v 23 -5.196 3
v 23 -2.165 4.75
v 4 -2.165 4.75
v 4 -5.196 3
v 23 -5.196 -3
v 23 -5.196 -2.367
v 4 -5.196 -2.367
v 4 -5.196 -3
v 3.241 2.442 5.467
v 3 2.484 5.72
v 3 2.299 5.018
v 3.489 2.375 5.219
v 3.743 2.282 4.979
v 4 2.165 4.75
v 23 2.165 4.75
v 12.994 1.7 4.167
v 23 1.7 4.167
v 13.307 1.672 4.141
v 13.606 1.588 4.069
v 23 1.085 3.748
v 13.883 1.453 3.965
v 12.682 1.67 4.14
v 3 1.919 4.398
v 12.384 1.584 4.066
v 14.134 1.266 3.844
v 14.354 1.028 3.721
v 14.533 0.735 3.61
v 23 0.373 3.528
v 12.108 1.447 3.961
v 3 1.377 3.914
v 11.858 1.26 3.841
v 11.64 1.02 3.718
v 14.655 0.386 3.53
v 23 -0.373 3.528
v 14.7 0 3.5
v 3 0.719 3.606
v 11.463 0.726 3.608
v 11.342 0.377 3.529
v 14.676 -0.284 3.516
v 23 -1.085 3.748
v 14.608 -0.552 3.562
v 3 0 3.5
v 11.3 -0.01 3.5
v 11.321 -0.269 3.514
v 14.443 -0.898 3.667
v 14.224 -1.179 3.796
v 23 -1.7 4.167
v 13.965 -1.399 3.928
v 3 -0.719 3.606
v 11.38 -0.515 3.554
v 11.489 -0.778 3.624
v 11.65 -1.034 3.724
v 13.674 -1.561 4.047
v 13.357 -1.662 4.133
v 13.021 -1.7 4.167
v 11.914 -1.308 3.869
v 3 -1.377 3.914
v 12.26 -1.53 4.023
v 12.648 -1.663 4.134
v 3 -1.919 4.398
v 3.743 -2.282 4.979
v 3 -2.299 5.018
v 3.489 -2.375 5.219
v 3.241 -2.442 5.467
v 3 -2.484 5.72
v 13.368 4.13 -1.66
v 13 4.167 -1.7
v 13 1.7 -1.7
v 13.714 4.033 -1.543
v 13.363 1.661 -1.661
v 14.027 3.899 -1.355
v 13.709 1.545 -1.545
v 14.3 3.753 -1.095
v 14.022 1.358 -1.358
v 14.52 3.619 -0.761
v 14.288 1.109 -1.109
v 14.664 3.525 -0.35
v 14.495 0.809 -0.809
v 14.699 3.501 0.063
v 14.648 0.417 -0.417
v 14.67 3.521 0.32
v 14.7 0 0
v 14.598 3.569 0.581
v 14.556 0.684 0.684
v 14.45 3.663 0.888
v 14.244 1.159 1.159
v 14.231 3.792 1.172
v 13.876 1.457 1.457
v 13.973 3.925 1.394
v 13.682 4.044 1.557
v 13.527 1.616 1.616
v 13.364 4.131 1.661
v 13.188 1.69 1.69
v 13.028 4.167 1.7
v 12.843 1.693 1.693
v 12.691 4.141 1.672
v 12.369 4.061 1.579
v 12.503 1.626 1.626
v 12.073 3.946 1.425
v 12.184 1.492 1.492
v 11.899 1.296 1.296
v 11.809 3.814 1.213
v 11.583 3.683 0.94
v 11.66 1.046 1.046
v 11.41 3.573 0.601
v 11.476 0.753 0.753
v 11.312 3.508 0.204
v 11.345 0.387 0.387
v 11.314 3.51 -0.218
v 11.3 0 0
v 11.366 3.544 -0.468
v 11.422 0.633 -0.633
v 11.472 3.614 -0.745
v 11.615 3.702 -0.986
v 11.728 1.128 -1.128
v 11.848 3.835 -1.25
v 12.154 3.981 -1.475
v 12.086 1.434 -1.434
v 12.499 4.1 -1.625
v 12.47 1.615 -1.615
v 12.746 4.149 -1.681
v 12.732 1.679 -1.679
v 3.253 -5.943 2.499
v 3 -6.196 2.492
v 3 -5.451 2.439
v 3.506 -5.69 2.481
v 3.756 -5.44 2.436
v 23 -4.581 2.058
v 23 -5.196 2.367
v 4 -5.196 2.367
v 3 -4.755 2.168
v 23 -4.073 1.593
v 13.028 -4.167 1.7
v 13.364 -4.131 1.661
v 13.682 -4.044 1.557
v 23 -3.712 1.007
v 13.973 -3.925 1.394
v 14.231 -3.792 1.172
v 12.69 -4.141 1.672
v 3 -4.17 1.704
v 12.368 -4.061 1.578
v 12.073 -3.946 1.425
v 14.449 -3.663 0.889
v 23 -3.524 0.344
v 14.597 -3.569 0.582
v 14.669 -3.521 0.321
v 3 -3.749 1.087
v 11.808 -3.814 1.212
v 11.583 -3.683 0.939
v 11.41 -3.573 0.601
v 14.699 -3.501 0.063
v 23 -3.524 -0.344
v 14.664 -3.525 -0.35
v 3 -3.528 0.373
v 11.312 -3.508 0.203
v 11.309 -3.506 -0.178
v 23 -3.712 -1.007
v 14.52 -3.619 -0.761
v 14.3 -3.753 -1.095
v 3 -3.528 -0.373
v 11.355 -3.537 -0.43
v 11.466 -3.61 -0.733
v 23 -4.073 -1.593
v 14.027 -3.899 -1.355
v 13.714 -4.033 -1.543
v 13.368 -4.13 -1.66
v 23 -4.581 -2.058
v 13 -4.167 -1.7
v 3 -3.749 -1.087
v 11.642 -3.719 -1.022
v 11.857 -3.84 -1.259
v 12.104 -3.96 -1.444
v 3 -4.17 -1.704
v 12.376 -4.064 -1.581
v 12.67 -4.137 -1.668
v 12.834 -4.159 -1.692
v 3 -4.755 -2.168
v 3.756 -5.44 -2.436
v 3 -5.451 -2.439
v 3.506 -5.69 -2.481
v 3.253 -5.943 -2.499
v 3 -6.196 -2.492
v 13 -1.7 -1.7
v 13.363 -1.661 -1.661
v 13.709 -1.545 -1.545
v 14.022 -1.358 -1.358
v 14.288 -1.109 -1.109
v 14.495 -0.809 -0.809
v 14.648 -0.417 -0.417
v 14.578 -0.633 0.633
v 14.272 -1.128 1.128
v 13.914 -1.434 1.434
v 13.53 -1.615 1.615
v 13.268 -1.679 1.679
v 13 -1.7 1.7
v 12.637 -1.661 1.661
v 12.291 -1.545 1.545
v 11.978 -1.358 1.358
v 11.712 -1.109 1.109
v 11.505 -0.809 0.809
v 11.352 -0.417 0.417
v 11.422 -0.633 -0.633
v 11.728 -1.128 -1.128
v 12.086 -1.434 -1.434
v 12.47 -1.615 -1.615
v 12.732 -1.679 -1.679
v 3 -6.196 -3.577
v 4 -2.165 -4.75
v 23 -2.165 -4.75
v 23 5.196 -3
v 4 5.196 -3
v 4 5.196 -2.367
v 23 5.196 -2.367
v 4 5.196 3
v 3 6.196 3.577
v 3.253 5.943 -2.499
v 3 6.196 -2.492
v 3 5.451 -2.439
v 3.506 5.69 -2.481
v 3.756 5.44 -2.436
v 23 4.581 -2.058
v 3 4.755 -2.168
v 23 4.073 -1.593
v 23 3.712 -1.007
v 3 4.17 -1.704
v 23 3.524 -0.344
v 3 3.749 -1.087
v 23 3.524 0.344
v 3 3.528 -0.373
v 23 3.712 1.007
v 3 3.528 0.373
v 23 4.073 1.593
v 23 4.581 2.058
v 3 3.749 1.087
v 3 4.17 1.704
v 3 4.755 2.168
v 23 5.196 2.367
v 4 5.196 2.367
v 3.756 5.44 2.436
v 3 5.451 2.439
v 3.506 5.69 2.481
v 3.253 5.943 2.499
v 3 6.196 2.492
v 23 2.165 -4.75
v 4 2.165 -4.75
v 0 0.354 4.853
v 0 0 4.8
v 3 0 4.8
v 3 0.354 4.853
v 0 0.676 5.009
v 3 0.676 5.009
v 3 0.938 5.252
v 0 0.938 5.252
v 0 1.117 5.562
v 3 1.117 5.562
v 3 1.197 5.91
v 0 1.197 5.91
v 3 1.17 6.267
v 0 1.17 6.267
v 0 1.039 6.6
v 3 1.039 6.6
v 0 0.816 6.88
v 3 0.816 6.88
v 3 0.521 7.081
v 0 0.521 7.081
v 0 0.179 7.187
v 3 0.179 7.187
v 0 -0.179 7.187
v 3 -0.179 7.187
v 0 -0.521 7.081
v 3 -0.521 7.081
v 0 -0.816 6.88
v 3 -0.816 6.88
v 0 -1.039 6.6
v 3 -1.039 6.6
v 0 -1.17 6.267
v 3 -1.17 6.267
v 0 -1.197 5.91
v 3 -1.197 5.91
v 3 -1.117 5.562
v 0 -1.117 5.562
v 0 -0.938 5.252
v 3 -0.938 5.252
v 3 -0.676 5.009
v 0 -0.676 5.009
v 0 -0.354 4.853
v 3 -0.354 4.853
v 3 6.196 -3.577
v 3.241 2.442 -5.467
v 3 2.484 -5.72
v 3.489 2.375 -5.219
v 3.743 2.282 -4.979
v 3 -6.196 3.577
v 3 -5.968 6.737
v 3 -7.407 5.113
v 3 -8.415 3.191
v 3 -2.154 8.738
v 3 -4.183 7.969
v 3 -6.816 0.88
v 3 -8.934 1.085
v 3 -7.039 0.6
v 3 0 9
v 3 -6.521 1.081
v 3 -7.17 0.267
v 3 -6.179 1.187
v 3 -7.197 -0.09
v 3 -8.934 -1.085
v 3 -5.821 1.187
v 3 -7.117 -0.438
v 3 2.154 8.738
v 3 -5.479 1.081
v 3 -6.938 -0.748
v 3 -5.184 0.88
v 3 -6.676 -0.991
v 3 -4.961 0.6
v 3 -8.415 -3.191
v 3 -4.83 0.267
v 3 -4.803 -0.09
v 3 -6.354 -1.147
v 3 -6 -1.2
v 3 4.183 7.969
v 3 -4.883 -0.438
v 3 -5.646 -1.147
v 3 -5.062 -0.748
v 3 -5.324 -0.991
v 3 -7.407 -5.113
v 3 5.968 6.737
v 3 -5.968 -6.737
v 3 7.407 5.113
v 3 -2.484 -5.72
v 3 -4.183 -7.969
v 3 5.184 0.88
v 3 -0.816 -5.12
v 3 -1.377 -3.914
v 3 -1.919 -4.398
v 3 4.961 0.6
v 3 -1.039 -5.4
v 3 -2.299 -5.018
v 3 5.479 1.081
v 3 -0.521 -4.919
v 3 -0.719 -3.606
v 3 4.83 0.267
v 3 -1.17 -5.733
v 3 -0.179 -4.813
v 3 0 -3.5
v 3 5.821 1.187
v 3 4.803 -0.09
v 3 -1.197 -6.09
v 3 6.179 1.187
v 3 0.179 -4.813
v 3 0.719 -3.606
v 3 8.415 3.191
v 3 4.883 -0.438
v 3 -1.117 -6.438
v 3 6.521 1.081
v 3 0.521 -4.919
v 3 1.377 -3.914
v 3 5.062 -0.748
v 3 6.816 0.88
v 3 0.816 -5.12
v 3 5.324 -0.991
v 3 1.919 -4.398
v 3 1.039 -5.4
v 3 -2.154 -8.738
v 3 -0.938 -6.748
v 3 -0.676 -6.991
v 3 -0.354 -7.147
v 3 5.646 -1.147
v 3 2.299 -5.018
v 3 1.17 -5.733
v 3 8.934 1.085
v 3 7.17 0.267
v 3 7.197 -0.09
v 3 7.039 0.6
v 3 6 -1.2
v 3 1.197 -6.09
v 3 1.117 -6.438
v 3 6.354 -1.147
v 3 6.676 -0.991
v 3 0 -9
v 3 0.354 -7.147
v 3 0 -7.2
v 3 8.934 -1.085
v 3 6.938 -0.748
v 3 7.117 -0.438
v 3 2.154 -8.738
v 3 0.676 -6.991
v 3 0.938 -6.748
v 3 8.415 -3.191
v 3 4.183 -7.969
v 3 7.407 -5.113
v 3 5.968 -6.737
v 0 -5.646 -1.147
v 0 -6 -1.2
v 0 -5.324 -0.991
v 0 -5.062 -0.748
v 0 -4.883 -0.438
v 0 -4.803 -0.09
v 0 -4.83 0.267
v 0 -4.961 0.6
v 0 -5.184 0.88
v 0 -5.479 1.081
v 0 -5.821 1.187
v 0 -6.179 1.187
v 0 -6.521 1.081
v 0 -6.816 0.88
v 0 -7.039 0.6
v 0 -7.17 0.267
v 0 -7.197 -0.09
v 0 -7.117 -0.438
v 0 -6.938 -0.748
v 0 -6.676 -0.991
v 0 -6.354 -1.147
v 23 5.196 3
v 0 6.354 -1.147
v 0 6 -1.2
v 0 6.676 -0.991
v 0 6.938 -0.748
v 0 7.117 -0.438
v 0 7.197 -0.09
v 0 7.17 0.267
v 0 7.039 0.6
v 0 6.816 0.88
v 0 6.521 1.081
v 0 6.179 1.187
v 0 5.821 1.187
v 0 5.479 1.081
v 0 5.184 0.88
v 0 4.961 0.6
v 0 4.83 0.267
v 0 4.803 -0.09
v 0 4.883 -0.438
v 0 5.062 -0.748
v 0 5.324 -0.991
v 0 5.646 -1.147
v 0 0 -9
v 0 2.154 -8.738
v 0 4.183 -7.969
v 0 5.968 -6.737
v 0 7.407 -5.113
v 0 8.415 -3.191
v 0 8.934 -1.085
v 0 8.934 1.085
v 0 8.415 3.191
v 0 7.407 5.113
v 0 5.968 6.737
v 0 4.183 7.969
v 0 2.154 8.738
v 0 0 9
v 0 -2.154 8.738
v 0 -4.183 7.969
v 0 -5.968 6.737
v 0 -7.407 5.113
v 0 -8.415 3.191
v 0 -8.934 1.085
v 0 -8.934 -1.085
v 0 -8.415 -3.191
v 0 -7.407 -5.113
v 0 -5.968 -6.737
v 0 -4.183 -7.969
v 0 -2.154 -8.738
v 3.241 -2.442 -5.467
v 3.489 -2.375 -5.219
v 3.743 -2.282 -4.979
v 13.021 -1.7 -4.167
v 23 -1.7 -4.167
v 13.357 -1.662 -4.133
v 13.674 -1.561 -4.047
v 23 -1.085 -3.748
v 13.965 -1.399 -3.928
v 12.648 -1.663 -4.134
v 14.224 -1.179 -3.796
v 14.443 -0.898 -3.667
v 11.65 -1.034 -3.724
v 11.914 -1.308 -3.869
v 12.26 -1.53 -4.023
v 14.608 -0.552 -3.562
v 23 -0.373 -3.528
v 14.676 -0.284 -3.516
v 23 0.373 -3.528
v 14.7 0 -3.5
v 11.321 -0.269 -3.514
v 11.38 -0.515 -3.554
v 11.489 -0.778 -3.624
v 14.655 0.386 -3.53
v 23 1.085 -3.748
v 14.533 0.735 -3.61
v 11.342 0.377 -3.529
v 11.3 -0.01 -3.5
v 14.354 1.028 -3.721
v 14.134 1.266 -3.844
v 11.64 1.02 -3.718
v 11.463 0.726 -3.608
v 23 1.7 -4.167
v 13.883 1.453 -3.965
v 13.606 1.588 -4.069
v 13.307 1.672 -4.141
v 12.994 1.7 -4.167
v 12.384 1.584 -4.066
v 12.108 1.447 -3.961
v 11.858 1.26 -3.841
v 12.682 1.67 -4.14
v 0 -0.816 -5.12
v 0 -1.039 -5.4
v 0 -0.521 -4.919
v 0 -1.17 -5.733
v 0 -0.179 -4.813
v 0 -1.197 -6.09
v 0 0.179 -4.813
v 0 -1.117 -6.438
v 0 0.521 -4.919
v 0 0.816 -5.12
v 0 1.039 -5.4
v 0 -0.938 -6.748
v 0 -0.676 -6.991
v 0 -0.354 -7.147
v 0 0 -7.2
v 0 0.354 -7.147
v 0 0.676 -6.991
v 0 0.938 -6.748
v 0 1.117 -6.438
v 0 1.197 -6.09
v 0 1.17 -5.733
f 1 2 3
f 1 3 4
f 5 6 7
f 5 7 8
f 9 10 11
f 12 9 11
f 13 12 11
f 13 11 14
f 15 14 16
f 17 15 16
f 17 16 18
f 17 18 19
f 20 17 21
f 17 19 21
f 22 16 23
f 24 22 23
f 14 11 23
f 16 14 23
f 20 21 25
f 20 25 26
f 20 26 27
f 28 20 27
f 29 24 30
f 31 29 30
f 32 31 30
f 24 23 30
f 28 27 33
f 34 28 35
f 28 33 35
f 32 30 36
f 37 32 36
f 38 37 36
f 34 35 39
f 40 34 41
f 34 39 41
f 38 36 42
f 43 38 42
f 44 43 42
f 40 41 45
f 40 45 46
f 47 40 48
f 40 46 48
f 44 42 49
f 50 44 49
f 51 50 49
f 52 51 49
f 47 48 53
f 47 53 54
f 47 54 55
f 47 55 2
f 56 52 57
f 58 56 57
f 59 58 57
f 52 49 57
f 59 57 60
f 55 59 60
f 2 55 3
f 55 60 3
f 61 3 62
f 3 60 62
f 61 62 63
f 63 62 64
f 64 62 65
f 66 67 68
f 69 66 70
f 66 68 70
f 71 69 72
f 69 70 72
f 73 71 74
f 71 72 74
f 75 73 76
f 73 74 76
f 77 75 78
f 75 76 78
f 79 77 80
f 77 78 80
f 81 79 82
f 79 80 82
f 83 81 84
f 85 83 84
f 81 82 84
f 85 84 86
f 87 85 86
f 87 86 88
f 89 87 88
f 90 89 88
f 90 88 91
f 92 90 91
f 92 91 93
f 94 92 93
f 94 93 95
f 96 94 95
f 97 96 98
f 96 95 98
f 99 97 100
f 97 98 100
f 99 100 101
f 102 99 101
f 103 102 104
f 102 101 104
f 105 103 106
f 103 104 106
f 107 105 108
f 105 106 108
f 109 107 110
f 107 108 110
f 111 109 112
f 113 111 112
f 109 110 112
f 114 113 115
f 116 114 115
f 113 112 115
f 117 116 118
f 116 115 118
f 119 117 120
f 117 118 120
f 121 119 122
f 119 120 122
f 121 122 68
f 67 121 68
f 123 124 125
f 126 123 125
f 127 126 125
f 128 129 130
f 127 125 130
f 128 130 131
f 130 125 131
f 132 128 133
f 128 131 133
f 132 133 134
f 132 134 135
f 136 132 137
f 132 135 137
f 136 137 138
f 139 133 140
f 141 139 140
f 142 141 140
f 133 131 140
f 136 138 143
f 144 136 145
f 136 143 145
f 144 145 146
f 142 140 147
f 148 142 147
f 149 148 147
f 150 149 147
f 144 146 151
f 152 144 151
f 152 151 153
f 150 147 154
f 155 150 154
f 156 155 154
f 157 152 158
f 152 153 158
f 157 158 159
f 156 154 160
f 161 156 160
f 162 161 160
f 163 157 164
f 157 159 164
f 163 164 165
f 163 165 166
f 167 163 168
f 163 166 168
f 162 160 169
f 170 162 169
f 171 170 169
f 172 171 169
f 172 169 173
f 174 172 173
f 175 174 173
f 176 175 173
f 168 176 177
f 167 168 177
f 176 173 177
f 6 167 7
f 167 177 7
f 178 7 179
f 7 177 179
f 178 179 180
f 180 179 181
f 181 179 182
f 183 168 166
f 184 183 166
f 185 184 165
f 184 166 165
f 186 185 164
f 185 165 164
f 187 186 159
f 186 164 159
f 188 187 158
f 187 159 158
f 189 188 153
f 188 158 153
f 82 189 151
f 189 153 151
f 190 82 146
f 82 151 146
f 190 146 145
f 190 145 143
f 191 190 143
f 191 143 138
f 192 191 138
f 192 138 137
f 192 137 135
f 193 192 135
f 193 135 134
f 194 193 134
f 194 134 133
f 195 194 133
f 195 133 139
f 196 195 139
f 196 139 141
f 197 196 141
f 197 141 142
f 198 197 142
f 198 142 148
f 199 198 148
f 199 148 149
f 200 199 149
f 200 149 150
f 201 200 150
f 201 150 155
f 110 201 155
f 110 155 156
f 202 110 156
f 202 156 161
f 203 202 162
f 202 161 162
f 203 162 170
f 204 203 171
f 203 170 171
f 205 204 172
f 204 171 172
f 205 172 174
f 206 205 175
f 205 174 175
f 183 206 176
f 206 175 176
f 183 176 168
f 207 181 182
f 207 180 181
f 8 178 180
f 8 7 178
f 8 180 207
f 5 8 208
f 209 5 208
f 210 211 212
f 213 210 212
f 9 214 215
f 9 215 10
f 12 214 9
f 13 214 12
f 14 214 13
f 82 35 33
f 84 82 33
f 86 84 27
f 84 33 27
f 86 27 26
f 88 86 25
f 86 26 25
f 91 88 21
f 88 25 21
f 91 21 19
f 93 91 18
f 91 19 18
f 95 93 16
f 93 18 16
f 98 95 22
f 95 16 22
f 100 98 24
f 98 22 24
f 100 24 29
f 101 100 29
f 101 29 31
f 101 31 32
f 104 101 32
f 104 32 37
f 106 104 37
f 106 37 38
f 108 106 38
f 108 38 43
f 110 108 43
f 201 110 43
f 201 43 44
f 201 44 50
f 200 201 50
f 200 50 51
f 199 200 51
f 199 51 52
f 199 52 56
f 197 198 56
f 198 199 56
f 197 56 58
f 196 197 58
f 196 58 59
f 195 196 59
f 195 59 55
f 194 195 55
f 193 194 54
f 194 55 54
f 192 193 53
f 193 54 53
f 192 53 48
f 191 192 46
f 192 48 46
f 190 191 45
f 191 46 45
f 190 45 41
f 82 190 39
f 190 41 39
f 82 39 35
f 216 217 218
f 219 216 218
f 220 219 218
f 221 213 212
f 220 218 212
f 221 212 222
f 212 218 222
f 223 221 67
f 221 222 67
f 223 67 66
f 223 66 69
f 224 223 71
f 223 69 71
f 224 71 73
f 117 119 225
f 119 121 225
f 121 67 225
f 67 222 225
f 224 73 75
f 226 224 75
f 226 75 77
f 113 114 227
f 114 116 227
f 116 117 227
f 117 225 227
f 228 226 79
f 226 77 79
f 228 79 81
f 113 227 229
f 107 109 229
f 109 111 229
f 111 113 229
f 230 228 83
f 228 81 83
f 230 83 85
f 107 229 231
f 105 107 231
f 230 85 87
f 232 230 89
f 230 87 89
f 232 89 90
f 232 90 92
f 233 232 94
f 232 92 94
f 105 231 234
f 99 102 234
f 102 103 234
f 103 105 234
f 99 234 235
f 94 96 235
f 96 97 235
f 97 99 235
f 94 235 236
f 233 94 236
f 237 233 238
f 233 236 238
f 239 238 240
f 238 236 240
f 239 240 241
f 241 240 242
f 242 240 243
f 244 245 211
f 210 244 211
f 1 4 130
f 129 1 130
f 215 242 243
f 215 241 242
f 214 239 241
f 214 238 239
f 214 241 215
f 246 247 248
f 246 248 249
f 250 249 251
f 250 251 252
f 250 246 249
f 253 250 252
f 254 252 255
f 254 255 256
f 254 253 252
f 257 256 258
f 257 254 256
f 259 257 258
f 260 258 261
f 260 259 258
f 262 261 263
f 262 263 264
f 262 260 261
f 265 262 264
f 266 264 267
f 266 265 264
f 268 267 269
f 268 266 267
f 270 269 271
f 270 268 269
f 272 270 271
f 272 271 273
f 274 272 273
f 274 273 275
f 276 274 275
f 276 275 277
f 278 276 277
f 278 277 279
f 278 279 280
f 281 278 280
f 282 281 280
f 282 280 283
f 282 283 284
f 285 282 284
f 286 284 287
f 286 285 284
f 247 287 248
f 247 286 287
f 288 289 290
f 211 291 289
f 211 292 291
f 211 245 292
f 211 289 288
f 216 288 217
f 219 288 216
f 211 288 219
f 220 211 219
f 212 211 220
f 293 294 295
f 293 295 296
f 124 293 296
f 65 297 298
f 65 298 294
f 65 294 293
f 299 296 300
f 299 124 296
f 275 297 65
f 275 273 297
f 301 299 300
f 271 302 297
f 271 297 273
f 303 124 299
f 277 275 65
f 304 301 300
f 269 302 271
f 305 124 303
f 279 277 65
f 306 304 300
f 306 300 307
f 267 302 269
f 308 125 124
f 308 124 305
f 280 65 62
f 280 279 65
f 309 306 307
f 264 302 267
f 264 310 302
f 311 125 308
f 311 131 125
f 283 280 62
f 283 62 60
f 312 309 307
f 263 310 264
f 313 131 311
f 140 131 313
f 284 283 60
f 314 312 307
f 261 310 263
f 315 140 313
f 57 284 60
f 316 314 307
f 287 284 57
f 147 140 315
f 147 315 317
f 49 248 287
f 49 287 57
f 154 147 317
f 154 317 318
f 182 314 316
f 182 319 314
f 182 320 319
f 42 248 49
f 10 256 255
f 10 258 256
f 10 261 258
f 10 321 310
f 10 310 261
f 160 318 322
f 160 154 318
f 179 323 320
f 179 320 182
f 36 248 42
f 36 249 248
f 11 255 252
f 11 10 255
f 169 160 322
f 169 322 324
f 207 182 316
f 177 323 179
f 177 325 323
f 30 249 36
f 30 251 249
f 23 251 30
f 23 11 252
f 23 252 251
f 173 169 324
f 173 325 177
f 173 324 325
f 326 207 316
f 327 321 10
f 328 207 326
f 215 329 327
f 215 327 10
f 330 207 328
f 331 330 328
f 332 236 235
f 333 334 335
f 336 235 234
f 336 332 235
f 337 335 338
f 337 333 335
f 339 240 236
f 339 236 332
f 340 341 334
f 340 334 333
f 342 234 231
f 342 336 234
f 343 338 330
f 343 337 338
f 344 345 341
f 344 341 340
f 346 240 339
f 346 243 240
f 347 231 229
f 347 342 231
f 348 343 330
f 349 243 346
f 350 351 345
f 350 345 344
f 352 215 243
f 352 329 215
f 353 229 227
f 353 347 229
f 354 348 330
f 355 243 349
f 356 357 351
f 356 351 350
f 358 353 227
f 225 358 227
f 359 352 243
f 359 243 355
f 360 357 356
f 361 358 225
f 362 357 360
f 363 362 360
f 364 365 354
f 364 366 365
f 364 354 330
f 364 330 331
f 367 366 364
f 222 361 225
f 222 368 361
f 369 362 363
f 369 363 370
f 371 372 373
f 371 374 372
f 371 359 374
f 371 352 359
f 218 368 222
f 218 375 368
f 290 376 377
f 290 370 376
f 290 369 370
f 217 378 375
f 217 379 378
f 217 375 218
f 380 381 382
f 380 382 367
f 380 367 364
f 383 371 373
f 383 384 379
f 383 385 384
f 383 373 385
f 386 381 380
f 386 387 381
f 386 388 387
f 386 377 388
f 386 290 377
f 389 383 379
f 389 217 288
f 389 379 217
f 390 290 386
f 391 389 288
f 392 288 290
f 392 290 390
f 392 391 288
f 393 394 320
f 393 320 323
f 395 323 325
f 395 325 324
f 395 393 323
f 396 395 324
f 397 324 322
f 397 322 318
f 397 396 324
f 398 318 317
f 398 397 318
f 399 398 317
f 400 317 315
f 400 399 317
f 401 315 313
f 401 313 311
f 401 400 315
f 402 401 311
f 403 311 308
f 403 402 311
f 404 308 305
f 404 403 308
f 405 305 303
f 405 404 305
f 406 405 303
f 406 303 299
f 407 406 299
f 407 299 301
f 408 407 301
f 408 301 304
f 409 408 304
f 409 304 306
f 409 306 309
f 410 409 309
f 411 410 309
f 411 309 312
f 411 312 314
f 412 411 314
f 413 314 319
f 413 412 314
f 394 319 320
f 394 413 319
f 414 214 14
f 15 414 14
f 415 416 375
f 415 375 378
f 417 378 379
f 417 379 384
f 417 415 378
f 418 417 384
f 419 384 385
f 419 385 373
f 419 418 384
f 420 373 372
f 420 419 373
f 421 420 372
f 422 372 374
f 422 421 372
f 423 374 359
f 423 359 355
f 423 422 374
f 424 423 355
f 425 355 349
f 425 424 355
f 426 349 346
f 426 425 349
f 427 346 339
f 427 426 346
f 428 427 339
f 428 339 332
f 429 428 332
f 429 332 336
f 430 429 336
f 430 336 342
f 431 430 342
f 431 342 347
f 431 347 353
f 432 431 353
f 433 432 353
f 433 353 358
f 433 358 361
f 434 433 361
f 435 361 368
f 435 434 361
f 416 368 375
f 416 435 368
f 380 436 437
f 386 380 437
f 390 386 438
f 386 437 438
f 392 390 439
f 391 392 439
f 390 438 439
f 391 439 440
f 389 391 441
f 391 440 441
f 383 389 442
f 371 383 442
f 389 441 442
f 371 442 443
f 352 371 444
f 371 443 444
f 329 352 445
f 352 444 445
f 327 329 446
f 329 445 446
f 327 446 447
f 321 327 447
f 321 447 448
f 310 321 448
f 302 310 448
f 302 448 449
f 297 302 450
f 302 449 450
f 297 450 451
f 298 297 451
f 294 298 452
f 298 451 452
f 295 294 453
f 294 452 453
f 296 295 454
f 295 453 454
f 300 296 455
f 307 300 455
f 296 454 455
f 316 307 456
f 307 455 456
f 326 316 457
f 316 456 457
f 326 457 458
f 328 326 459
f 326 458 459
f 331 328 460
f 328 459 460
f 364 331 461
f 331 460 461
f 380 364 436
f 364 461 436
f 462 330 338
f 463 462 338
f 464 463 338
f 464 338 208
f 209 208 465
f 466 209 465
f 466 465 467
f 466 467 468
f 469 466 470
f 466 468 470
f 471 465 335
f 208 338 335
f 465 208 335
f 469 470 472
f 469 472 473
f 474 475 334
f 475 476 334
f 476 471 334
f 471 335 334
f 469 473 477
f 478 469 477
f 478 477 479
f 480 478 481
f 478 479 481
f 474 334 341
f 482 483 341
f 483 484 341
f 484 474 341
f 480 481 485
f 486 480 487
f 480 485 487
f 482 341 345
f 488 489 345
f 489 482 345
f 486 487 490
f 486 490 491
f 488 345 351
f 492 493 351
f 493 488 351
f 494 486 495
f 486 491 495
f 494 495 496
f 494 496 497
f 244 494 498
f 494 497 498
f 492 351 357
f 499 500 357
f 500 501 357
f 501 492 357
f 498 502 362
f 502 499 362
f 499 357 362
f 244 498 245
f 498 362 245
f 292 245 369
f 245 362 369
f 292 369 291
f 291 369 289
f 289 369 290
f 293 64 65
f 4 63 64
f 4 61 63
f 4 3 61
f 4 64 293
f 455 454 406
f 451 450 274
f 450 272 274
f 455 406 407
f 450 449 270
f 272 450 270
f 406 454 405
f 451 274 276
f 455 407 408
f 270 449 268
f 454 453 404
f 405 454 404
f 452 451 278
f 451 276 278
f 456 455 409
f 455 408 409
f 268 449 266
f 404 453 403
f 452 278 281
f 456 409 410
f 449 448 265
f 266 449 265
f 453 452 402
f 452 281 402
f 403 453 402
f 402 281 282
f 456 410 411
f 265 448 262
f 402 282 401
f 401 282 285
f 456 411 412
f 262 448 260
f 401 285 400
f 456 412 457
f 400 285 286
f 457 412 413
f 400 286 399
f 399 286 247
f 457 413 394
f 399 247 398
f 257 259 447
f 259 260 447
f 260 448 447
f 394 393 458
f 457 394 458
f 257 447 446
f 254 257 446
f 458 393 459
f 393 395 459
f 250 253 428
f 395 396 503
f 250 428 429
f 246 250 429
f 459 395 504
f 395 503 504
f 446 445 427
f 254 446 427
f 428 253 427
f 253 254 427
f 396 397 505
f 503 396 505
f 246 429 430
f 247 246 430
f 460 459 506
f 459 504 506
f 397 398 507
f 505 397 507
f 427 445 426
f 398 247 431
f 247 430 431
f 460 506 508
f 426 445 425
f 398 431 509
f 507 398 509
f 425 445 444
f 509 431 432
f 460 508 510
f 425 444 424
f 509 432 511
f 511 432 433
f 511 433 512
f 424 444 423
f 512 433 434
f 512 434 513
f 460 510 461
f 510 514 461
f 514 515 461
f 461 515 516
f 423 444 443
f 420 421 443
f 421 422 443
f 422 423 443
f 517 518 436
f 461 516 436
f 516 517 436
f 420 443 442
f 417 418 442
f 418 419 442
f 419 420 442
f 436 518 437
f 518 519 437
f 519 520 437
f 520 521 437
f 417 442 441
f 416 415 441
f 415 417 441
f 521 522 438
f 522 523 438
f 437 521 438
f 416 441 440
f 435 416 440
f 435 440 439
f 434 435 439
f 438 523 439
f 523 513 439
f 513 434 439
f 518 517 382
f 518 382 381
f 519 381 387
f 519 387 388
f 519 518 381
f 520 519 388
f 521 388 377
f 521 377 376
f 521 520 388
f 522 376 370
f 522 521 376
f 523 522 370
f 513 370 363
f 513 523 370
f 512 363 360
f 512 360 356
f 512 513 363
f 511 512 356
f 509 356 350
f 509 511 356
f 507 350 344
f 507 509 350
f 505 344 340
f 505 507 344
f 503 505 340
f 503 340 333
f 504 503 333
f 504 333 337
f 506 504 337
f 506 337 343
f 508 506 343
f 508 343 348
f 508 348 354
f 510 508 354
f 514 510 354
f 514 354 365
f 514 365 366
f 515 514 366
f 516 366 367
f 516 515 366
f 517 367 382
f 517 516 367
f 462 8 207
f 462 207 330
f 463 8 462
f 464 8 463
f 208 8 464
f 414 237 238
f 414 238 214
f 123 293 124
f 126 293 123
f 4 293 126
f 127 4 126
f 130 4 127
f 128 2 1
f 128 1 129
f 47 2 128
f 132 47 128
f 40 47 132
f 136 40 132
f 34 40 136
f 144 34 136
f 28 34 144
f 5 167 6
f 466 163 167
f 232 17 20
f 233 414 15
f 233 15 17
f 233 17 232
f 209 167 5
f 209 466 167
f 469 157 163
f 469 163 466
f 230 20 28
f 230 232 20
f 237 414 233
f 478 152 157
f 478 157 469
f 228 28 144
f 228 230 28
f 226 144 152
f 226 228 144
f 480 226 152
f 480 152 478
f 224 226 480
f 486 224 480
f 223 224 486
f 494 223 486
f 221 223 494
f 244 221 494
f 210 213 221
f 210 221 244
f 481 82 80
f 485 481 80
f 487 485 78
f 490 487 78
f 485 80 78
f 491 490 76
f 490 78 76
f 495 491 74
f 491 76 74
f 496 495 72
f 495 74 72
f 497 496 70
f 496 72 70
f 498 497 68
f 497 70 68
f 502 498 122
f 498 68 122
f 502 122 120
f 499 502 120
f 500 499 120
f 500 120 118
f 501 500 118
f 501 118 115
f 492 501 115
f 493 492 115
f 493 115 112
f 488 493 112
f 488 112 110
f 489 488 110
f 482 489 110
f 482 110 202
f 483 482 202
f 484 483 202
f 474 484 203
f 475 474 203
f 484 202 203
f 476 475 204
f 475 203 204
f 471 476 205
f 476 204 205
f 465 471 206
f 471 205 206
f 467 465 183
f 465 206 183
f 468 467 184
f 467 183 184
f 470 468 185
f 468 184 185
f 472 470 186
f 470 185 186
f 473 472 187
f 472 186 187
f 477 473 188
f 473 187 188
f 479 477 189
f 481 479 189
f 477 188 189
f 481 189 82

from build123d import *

# Parameters (mm, degrees)
SKETCH1_R           = 9
SKETCH1_R_2         = 1.2
BOSS_EXTRUDE1_DEPTH = 3
BOSS_EXTRUDE2_DEPTH = 20
CHAMFER1_SIZE       = 1
SKETCH4_R           = 1.7
CUT_EXTRUDE1_DEPTH  = 29.487378672
SKETCH5_R           = 1.7
CUT_EXTRUDE2_DEPTH  = 29.896366633


with BuildPart() as part:
    # Sketch1 → Boss-Extrude1 (new body)
    with BuildSketch(Plane(origin=(0, 0, 0), x_dir=(0, 0, -1), z_dir=(1, 0, 0))):
        Circle(SKETCH1_R)
        with Locations((0, 6)):
            Circle(SKETCH1_R_2, mode=Mode.SUBTRACT)
        with Locations((6, 0)):
            Circle(SKETCH1_R_2, mode=Mode.SUBTRACT)
        with Locations((-6, 0)):
            Circle(SKETCH1_R_2, mode=Mode.SUBTRACT)
        with Locations((0, -6)):
            Circle(SKETCH1_R_2, mode=Mode.SUBTRACT)
    extrude(amount=BOSS_EXTRUDE1_DEPTH)

    # Sketch2 → Boss-Extrude2 (add)
    with BuildSketch(Plane(origin=(3, 0, 0), x_dir=(0, 0, -1), z_dir=(1, 0, 0))):
        with BuildLine():
            Line((2.367240814, -5.196152423), (3, -5.196152423))
            Line((3, -5.196152423), (4.75, -2.165063509))
            ThreePointArc((4.75, -2.165063509), (3.5, 0), (4.75, 2.165063509))
            Line((4.75, 2.165063509), (3, 5.196152423))
            Line((3, 5.196152423), (2.367240814, 5.196152423))
            ThreePointArc((2.367240814, 5.196152423), (0, 3.5), (-2.367240814, 5.196152423))
            Line((-2.367240814, 5.196152423), (-3, 5.196152423))
            Line((-3, 5.196152423), (-4.75, 2.165063509))
            ThreePointArc((-4.75, 2.165063509), (-3.5, 0), (-4.75, -2.165063509))
            Line((-4.75, -2.165063509), (-3, -5.196152423))
            Line((-3, -5.196152423), (-2.367240814, -5.196152423))
            ThreePointArc((-2.367240814, -5.196152423), (0, -3.5), (2.367240814, -5.196152423))
        make_face()
    extrude(amount=BOSS_EXTRUDE2_DEPTH)

    # Chamfer1
    chamfer1_edges = [part.edges().sort_by_distance(p)[0] for p in [
        (3, -3.680607966, 3.875),
        (3, -5.196152423, 2.683620407),
        (3, -5.196152423, -2.683620407),
        (3, -3.680607966, -3.875),
        (3, 3.680607966, -3.875),
        (3, 5.196152423, -2.683620407),
        (3, 3.680607966, 3.875),
        (3, 5.196152423, 2.683620407),
    ]]
    chamfer(chamfer1_edges, length=CHAMFER1_SIZE)

    # Sketch4 → Cut-Extrude1 (cut, through all)
    with BuildSketch(Plane.XZ.offset(5.196152423)):
        with Locations((13, 0)):
            Circle(SKETCH4_R)
    extrude(amount=-CUT_EXTRUDE1_DEPTH, mode=Mode.SUBTRACT)

    # Sketch5 → Cut-Extrude2 (cut, through all)
    with BuildSketch(Plane.XY.offset(6)):
        with Locations((13, 0)):
            Circle(SKETCH5_R)
    extrude(amount=-CUT_EXTRUDE2_DEPTH, mode=Mode.SUBTRACT)


solid = part.part
